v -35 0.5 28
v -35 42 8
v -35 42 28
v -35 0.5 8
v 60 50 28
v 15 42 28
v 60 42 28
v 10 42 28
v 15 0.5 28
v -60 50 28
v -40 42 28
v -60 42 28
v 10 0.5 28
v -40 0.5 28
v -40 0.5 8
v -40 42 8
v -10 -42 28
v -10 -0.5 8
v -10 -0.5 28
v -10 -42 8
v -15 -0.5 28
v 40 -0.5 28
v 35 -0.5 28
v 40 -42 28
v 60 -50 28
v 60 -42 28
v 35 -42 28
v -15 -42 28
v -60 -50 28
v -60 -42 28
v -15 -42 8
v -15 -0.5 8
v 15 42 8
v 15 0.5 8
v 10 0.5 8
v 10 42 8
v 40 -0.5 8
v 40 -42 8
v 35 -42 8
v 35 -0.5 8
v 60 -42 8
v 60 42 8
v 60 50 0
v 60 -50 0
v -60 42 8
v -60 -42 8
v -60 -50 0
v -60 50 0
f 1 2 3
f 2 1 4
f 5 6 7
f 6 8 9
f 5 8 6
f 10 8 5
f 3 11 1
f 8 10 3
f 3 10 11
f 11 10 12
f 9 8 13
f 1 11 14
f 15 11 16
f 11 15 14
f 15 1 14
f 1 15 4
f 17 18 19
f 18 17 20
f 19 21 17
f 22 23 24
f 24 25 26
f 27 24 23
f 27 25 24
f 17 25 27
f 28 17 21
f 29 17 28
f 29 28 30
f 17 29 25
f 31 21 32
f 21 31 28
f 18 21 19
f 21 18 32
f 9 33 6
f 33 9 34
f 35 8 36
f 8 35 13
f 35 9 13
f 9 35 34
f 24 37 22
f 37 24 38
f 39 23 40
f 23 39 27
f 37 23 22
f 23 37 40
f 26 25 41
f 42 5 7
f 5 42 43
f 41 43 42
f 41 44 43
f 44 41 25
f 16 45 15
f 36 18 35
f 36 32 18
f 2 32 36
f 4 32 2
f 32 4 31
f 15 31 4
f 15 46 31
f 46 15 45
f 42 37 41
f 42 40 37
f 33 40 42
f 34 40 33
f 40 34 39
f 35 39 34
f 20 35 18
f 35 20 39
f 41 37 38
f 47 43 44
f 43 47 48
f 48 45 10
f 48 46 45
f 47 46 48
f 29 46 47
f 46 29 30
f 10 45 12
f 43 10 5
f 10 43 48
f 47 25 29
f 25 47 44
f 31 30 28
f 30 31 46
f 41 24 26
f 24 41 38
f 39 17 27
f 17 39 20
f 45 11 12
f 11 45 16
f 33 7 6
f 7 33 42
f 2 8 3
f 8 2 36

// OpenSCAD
$fn = 32;

// ----------------------------------------------------------------------
// Rib frame 120 x 100 x 28
// 4 ribs at 25 mm pitch, staggered
// ----------------------------------------------------------------------

// --- parameters (mm) ---
frame = [120, 100, 8];  // base plate size (x, y, z)
rail_w = 8;             // side rail width
ribs = 4;               // number of ribs
rib_t = 5;              // rib thickness
rib_h = 20;             // rib height above the base plate
pitch = 25;             // pitch between rib centres

// --- derived feature positions (mm) ---
span = (ribs - 1) * pitch;          // = 75   distance between the outer ribs
origin_x = -span / 2;               // = -37.5   X of the first rib
rib_len = frame[1] / 2 - rail_w + 0.5;  // = 42.5   length of a staggered rib
rib_y = 0.5 + rib_len / 2;          // = 21.75   Y of a staggered rib centre
row_offset = 2 * rib_y;             // = 43.5   distance between the two rows
feature_centers = [
  [origin_x + 0 * pitch, rib_y],
  [origin_x + 1 * pitch, -rib_y],
  [origin_x + 2 * pitch, rib_y],
  [origin_x + 3 * pitch, -rib_y]
];   // rib centre line, drives the rib loop

// base plate, two side rails, then the ribs read straight off feature_centers
union() {
  translate([-frame[0] / 2, -frame[1] / 2, 0]) cube(frame);
  translate([-frame[0] / 2, -frame[1] / 2, 0]) cube([frame[0], rail_w, frame[2] + rib_h]);
  translate([-frame[0] / 2, frame[1] / 2 - rail_w, 0]) cube([frame[0], rail_w, frame[2] + rib_h]);
  for (centre = feature_centers)
    translate([centre[0] - rib_t / 2, centre[1] - rib_len / 2, frame[2] - 1])
      cube([rib_t, rib_len, rib_h + 1]);
}
